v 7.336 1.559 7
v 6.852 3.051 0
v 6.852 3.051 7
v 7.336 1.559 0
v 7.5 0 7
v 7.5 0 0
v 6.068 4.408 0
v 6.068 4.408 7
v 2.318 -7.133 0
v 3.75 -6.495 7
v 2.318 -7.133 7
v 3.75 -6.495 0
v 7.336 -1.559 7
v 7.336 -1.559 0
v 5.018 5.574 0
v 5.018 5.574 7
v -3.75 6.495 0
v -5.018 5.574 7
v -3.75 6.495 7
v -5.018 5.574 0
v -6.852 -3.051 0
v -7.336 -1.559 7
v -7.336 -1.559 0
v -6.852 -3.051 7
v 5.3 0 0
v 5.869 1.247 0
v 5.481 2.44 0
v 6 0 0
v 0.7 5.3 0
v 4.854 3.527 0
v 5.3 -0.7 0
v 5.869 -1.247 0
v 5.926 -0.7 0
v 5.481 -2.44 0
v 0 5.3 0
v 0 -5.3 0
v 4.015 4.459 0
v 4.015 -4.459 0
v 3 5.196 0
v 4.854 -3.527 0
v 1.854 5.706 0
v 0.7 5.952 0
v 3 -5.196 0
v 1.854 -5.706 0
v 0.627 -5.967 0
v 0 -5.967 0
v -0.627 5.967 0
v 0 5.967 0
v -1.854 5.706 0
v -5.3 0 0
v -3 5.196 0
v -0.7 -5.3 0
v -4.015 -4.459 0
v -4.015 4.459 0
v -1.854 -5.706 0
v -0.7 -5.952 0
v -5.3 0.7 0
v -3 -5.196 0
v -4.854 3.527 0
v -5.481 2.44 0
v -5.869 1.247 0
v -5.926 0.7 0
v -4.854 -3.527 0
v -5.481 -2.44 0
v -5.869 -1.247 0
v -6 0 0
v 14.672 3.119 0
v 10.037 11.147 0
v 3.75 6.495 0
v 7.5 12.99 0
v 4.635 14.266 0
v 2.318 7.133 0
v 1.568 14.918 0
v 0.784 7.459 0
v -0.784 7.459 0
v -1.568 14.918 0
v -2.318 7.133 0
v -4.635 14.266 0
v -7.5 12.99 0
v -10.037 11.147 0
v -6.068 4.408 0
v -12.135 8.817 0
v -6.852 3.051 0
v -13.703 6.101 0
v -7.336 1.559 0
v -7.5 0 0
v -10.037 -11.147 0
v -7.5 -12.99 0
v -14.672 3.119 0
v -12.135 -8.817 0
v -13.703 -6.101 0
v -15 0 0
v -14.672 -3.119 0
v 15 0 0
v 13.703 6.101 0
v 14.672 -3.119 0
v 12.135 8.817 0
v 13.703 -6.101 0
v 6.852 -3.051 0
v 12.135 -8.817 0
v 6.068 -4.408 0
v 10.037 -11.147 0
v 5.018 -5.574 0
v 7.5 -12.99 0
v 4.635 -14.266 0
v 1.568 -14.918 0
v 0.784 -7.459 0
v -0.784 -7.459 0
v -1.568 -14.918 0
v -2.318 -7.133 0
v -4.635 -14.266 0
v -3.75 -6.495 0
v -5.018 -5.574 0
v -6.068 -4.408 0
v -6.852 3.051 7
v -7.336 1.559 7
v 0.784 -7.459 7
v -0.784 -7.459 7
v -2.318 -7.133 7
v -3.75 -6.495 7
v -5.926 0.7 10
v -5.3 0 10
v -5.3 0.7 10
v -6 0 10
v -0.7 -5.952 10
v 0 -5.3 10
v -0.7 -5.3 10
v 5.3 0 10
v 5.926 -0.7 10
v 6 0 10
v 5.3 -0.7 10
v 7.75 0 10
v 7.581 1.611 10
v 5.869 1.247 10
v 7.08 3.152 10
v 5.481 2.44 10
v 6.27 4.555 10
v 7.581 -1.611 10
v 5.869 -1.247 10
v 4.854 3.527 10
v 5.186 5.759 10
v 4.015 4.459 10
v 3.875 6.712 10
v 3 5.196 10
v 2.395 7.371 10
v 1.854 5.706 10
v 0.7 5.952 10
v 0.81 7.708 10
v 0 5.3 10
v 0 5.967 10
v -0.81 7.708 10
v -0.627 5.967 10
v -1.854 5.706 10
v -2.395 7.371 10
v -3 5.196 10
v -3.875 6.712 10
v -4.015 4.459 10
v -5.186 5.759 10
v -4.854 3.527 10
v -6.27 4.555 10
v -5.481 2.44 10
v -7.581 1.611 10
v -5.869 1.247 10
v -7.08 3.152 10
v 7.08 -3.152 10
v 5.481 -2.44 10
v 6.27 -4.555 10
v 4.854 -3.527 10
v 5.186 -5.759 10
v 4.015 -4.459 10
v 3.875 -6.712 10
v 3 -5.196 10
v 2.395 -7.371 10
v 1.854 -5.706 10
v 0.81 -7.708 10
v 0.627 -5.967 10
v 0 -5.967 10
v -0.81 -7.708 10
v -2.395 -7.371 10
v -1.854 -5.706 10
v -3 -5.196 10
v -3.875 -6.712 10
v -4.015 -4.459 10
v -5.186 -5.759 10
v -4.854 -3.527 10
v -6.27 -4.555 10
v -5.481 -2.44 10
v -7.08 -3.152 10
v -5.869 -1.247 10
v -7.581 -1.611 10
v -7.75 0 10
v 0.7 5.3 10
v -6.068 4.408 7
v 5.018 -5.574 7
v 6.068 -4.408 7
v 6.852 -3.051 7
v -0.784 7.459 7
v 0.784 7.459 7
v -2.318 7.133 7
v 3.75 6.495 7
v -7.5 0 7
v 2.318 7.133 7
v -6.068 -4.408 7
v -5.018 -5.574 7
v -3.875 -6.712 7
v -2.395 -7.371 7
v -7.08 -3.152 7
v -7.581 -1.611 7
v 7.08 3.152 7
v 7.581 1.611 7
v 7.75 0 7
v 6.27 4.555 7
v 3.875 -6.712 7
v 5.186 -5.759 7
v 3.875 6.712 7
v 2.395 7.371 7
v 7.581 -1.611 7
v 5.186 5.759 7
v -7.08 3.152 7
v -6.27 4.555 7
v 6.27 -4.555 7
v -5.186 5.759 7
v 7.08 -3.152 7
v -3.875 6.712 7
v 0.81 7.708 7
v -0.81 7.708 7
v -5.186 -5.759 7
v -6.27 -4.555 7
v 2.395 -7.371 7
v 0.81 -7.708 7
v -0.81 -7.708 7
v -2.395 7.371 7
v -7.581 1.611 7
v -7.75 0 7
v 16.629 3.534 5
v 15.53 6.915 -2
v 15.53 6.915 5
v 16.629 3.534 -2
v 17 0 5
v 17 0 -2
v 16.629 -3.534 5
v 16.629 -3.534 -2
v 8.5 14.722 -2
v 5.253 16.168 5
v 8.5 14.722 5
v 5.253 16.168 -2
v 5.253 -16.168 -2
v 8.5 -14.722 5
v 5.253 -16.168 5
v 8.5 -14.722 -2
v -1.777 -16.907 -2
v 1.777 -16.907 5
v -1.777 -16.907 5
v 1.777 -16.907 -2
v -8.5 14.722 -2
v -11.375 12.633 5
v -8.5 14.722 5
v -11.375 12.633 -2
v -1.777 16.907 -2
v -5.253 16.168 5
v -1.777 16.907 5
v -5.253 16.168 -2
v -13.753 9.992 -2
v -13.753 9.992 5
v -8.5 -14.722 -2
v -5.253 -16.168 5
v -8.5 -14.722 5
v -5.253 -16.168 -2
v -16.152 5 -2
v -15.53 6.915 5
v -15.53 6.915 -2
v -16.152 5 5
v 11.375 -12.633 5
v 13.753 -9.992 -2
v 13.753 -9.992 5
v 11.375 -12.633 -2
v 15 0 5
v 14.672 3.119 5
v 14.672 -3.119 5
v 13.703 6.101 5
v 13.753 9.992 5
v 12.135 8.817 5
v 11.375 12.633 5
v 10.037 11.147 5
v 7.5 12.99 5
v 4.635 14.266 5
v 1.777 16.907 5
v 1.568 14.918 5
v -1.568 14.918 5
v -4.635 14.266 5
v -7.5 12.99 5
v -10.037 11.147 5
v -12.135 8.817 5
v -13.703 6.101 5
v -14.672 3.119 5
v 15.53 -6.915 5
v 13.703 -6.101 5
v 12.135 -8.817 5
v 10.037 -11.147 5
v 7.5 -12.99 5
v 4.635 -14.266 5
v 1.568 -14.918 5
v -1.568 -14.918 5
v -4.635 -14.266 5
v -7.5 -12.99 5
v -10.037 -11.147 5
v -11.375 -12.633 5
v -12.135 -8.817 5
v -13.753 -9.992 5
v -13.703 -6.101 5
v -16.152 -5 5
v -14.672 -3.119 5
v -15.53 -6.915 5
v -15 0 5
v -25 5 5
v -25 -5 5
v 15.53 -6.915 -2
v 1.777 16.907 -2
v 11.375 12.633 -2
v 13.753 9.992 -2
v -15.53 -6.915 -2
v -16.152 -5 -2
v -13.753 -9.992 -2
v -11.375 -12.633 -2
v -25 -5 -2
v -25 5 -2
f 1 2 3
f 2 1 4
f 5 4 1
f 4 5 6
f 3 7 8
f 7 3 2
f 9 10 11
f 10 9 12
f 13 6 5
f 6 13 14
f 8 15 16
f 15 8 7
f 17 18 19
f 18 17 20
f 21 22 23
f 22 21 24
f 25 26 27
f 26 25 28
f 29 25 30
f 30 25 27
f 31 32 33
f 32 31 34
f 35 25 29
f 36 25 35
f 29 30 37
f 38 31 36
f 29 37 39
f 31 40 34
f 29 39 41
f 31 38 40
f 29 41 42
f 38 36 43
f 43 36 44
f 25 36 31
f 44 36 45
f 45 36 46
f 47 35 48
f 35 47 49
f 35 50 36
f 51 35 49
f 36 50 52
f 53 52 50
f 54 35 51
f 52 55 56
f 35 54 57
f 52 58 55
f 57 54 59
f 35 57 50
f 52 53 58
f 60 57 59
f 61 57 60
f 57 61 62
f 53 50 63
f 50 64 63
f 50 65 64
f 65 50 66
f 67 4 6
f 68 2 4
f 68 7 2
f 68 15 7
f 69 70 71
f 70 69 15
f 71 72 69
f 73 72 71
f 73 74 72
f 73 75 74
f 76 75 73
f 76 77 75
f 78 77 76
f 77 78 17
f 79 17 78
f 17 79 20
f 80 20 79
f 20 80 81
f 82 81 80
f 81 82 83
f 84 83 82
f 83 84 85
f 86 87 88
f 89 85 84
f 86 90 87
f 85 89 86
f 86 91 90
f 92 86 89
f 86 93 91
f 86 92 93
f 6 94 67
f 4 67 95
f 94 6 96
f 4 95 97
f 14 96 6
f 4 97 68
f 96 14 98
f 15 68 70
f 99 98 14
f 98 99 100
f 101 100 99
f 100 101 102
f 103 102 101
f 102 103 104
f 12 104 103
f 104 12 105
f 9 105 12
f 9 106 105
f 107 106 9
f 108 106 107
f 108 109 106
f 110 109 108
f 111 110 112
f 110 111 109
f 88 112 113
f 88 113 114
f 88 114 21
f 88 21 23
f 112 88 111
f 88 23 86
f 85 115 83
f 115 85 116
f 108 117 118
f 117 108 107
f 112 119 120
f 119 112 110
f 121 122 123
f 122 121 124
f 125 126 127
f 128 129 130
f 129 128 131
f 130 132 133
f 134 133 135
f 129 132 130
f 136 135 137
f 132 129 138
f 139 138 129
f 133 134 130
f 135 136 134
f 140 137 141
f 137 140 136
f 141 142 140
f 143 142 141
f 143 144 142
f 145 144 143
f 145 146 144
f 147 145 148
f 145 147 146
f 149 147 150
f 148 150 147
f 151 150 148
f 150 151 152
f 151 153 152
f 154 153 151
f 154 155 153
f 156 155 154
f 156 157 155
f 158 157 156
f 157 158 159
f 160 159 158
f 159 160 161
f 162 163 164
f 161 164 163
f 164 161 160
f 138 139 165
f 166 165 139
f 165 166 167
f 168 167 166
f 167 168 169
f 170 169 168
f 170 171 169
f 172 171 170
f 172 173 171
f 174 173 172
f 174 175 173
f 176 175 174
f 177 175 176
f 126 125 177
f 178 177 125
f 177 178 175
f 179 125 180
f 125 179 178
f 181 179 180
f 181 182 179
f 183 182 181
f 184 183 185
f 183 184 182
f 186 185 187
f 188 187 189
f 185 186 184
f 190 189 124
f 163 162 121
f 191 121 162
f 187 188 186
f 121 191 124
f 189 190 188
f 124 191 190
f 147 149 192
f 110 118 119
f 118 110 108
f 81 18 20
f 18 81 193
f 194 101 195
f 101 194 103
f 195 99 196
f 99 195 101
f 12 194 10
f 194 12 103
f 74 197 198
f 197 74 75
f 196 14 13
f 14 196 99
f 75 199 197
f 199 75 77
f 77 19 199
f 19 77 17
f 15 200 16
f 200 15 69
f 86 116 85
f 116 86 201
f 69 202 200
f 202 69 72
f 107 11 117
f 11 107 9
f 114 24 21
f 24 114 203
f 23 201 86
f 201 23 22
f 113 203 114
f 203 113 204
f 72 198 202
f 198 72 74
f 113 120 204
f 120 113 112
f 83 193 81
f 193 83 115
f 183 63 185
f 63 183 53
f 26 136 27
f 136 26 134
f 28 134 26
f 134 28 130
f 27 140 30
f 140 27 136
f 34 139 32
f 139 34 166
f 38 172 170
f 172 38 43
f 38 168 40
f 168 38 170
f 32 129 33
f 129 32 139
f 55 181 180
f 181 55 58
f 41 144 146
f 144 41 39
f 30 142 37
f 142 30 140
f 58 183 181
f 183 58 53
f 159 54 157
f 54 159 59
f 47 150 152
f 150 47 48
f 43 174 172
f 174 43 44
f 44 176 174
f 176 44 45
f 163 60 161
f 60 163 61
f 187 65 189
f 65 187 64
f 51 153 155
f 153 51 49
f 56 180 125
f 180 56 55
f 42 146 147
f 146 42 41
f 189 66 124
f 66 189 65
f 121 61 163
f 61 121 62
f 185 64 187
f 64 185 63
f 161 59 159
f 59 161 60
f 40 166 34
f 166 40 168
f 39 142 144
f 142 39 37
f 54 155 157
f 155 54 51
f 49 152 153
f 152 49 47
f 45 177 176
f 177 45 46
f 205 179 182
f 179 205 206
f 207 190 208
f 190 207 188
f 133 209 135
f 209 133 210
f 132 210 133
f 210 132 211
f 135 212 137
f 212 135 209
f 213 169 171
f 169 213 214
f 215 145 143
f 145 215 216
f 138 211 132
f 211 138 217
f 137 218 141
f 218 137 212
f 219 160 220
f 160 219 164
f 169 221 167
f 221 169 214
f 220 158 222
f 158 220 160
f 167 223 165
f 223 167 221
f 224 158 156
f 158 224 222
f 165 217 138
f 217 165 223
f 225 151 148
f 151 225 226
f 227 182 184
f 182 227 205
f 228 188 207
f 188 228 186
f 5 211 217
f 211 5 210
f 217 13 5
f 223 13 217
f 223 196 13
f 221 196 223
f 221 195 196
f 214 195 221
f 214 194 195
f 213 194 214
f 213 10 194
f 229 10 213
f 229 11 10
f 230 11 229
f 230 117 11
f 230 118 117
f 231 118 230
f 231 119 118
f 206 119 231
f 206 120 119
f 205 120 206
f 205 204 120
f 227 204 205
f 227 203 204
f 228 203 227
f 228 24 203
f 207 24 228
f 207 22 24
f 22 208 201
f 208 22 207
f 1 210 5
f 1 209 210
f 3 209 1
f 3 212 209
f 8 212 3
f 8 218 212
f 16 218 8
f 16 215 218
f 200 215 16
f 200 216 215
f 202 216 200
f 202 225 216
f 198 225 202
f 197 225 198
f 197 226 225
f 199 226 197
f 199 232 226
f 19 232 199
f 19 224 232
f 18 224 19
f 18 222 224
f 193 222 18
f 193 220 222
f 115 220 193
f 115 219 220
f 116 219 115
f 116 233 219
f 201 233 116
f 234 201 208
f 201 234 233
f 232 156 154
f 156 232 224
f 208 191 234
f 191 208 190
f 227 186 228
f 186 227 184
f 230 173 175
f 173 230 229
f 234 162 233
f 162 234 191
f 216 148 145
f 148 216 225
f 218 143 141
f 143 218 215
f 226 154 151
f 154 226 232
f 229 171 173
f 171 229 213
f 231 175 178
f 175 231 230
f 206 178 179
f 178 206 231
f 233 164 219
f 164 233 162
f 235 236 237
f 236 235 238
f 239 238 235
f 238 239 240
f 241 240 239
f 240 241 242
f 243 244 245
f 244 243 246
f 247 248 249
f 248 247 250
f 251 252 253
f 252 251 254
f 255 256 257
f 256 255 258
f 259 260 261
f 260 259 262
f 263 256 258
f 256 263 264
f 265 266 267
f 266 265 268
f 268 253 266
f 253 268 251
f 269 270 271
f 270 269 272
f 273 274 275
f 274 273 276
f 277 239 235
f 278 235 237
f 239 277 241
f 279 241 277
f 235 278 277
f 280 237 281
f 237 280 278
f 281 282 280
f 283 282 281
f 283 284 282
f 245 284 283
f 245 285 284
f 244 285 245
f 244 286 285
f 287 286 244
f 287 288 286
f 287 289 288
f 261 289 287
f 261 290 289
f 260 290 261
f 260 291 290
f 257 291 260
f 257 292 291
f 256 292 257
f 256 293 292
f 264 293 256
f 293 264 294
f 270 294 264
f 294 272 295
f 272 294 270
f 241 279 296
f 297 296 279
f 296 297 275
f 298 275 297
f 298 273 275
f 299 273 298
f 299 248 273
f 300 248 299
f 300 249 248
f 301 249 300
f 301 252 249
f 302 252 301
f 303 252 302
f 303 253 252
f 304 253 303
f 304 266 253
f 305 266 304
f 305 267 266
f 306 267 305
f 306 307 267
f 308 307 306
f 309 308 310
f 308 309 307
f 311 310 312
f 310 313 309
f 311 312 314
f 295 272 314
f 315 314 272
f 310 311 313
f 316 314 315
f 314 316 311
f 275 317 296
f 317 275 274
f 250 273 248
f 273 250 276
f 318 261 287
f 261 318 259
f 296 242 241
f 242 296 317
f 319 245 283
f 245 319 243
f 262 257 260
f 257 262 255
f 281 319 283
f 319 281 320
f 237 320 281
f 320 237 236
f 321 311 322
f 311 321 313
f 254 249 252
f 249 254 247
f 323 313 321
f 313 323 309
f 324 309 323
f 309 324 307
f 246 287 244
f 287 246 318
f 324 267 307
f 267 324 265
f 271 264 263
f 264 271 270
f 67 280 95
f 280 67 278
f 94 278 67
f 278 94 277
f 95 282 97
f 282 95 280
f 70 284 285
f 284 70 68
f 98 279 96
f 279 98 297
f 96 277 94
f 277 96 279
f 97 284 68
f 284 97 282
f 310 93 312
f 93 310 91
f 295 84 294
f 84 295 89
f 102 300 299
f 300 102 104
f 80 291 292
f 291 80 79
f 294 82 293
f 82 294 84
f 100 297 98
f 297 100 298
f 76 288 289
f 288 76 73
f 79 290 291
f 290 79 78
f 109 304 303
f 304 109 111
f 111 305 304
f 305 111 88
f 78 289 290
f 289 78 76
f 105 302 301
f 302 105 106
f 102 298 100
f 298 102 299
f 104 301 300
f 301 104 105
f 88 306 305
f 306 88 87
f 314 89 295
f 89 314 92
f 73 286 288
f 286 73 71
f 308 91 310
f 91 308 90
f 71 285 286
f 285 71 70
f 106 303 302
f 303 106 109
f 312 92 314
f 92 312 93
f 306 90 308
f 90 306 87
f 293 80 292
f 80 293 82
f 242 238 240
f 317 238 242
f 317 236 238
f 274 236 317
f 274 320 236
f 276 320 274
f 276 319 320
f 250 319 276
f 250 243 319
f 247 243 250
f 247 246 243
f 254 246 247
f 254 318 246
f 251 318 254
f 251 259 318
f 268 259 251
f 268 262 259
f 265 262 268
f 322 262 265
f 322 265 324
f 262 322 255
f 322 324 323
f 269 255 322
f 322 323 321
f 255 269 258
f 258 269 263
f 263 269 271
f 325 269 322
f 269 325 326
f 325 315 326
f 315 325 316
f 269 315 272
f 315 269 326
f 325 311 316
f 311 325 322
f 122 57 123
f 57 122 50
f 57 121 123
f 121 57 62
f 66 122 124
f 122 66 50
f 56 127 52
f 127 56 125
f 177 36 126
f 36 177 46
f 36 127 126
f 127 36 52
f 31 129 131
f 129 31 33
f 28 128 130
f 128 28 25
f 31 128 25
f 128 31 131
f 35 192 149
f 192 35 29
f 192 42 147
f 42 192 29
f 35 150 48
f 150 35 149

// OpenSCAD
//OpenSCAD version 2021.01
//Mount for curtain rod spool holder for lack table 3d printer setup
//Simon Pilepich 2021-10-02

circle_resolution=30;
t=2;
tooth_depth=.7;


inner_z_clearance=5;

tube(15,12,10);
translate([0,0,7]) tube(15.5,12,3);
tube(34,30,inner_z_clearance);
translate([0,0,-t]) tube(34,0,t);
translate([-25,-inner_z_clearance,-t]) cube([10,10,inner_z_clearance+t]);
rotate([0,0,0]) translate([-12/2,0,0]) cube([tooth_depth,tooth_depth,10,]);
rotate([0,0,90]) translate([-12/2,0,0]) cube([tooth_depth,tooth_depth,10,]);
rotate([0,0,180]) translate([-12/2,0,0]) cube([tooth_depth,tooth_depth,10,]);
rotate([0,0,270]) translate([-12/2,0,0]) cube([tooth_depth,tooth_depth,10,]);


//a hollow cylider   
module tube(od, id, length) {
    difference() {
        cylinder(length, r = od / 2, $fn = circle_resolution);
        cylinder(length, r = id / 2, $fn = circle_resolution);
    }
}

module roundbox(x,y,z) {
    }
